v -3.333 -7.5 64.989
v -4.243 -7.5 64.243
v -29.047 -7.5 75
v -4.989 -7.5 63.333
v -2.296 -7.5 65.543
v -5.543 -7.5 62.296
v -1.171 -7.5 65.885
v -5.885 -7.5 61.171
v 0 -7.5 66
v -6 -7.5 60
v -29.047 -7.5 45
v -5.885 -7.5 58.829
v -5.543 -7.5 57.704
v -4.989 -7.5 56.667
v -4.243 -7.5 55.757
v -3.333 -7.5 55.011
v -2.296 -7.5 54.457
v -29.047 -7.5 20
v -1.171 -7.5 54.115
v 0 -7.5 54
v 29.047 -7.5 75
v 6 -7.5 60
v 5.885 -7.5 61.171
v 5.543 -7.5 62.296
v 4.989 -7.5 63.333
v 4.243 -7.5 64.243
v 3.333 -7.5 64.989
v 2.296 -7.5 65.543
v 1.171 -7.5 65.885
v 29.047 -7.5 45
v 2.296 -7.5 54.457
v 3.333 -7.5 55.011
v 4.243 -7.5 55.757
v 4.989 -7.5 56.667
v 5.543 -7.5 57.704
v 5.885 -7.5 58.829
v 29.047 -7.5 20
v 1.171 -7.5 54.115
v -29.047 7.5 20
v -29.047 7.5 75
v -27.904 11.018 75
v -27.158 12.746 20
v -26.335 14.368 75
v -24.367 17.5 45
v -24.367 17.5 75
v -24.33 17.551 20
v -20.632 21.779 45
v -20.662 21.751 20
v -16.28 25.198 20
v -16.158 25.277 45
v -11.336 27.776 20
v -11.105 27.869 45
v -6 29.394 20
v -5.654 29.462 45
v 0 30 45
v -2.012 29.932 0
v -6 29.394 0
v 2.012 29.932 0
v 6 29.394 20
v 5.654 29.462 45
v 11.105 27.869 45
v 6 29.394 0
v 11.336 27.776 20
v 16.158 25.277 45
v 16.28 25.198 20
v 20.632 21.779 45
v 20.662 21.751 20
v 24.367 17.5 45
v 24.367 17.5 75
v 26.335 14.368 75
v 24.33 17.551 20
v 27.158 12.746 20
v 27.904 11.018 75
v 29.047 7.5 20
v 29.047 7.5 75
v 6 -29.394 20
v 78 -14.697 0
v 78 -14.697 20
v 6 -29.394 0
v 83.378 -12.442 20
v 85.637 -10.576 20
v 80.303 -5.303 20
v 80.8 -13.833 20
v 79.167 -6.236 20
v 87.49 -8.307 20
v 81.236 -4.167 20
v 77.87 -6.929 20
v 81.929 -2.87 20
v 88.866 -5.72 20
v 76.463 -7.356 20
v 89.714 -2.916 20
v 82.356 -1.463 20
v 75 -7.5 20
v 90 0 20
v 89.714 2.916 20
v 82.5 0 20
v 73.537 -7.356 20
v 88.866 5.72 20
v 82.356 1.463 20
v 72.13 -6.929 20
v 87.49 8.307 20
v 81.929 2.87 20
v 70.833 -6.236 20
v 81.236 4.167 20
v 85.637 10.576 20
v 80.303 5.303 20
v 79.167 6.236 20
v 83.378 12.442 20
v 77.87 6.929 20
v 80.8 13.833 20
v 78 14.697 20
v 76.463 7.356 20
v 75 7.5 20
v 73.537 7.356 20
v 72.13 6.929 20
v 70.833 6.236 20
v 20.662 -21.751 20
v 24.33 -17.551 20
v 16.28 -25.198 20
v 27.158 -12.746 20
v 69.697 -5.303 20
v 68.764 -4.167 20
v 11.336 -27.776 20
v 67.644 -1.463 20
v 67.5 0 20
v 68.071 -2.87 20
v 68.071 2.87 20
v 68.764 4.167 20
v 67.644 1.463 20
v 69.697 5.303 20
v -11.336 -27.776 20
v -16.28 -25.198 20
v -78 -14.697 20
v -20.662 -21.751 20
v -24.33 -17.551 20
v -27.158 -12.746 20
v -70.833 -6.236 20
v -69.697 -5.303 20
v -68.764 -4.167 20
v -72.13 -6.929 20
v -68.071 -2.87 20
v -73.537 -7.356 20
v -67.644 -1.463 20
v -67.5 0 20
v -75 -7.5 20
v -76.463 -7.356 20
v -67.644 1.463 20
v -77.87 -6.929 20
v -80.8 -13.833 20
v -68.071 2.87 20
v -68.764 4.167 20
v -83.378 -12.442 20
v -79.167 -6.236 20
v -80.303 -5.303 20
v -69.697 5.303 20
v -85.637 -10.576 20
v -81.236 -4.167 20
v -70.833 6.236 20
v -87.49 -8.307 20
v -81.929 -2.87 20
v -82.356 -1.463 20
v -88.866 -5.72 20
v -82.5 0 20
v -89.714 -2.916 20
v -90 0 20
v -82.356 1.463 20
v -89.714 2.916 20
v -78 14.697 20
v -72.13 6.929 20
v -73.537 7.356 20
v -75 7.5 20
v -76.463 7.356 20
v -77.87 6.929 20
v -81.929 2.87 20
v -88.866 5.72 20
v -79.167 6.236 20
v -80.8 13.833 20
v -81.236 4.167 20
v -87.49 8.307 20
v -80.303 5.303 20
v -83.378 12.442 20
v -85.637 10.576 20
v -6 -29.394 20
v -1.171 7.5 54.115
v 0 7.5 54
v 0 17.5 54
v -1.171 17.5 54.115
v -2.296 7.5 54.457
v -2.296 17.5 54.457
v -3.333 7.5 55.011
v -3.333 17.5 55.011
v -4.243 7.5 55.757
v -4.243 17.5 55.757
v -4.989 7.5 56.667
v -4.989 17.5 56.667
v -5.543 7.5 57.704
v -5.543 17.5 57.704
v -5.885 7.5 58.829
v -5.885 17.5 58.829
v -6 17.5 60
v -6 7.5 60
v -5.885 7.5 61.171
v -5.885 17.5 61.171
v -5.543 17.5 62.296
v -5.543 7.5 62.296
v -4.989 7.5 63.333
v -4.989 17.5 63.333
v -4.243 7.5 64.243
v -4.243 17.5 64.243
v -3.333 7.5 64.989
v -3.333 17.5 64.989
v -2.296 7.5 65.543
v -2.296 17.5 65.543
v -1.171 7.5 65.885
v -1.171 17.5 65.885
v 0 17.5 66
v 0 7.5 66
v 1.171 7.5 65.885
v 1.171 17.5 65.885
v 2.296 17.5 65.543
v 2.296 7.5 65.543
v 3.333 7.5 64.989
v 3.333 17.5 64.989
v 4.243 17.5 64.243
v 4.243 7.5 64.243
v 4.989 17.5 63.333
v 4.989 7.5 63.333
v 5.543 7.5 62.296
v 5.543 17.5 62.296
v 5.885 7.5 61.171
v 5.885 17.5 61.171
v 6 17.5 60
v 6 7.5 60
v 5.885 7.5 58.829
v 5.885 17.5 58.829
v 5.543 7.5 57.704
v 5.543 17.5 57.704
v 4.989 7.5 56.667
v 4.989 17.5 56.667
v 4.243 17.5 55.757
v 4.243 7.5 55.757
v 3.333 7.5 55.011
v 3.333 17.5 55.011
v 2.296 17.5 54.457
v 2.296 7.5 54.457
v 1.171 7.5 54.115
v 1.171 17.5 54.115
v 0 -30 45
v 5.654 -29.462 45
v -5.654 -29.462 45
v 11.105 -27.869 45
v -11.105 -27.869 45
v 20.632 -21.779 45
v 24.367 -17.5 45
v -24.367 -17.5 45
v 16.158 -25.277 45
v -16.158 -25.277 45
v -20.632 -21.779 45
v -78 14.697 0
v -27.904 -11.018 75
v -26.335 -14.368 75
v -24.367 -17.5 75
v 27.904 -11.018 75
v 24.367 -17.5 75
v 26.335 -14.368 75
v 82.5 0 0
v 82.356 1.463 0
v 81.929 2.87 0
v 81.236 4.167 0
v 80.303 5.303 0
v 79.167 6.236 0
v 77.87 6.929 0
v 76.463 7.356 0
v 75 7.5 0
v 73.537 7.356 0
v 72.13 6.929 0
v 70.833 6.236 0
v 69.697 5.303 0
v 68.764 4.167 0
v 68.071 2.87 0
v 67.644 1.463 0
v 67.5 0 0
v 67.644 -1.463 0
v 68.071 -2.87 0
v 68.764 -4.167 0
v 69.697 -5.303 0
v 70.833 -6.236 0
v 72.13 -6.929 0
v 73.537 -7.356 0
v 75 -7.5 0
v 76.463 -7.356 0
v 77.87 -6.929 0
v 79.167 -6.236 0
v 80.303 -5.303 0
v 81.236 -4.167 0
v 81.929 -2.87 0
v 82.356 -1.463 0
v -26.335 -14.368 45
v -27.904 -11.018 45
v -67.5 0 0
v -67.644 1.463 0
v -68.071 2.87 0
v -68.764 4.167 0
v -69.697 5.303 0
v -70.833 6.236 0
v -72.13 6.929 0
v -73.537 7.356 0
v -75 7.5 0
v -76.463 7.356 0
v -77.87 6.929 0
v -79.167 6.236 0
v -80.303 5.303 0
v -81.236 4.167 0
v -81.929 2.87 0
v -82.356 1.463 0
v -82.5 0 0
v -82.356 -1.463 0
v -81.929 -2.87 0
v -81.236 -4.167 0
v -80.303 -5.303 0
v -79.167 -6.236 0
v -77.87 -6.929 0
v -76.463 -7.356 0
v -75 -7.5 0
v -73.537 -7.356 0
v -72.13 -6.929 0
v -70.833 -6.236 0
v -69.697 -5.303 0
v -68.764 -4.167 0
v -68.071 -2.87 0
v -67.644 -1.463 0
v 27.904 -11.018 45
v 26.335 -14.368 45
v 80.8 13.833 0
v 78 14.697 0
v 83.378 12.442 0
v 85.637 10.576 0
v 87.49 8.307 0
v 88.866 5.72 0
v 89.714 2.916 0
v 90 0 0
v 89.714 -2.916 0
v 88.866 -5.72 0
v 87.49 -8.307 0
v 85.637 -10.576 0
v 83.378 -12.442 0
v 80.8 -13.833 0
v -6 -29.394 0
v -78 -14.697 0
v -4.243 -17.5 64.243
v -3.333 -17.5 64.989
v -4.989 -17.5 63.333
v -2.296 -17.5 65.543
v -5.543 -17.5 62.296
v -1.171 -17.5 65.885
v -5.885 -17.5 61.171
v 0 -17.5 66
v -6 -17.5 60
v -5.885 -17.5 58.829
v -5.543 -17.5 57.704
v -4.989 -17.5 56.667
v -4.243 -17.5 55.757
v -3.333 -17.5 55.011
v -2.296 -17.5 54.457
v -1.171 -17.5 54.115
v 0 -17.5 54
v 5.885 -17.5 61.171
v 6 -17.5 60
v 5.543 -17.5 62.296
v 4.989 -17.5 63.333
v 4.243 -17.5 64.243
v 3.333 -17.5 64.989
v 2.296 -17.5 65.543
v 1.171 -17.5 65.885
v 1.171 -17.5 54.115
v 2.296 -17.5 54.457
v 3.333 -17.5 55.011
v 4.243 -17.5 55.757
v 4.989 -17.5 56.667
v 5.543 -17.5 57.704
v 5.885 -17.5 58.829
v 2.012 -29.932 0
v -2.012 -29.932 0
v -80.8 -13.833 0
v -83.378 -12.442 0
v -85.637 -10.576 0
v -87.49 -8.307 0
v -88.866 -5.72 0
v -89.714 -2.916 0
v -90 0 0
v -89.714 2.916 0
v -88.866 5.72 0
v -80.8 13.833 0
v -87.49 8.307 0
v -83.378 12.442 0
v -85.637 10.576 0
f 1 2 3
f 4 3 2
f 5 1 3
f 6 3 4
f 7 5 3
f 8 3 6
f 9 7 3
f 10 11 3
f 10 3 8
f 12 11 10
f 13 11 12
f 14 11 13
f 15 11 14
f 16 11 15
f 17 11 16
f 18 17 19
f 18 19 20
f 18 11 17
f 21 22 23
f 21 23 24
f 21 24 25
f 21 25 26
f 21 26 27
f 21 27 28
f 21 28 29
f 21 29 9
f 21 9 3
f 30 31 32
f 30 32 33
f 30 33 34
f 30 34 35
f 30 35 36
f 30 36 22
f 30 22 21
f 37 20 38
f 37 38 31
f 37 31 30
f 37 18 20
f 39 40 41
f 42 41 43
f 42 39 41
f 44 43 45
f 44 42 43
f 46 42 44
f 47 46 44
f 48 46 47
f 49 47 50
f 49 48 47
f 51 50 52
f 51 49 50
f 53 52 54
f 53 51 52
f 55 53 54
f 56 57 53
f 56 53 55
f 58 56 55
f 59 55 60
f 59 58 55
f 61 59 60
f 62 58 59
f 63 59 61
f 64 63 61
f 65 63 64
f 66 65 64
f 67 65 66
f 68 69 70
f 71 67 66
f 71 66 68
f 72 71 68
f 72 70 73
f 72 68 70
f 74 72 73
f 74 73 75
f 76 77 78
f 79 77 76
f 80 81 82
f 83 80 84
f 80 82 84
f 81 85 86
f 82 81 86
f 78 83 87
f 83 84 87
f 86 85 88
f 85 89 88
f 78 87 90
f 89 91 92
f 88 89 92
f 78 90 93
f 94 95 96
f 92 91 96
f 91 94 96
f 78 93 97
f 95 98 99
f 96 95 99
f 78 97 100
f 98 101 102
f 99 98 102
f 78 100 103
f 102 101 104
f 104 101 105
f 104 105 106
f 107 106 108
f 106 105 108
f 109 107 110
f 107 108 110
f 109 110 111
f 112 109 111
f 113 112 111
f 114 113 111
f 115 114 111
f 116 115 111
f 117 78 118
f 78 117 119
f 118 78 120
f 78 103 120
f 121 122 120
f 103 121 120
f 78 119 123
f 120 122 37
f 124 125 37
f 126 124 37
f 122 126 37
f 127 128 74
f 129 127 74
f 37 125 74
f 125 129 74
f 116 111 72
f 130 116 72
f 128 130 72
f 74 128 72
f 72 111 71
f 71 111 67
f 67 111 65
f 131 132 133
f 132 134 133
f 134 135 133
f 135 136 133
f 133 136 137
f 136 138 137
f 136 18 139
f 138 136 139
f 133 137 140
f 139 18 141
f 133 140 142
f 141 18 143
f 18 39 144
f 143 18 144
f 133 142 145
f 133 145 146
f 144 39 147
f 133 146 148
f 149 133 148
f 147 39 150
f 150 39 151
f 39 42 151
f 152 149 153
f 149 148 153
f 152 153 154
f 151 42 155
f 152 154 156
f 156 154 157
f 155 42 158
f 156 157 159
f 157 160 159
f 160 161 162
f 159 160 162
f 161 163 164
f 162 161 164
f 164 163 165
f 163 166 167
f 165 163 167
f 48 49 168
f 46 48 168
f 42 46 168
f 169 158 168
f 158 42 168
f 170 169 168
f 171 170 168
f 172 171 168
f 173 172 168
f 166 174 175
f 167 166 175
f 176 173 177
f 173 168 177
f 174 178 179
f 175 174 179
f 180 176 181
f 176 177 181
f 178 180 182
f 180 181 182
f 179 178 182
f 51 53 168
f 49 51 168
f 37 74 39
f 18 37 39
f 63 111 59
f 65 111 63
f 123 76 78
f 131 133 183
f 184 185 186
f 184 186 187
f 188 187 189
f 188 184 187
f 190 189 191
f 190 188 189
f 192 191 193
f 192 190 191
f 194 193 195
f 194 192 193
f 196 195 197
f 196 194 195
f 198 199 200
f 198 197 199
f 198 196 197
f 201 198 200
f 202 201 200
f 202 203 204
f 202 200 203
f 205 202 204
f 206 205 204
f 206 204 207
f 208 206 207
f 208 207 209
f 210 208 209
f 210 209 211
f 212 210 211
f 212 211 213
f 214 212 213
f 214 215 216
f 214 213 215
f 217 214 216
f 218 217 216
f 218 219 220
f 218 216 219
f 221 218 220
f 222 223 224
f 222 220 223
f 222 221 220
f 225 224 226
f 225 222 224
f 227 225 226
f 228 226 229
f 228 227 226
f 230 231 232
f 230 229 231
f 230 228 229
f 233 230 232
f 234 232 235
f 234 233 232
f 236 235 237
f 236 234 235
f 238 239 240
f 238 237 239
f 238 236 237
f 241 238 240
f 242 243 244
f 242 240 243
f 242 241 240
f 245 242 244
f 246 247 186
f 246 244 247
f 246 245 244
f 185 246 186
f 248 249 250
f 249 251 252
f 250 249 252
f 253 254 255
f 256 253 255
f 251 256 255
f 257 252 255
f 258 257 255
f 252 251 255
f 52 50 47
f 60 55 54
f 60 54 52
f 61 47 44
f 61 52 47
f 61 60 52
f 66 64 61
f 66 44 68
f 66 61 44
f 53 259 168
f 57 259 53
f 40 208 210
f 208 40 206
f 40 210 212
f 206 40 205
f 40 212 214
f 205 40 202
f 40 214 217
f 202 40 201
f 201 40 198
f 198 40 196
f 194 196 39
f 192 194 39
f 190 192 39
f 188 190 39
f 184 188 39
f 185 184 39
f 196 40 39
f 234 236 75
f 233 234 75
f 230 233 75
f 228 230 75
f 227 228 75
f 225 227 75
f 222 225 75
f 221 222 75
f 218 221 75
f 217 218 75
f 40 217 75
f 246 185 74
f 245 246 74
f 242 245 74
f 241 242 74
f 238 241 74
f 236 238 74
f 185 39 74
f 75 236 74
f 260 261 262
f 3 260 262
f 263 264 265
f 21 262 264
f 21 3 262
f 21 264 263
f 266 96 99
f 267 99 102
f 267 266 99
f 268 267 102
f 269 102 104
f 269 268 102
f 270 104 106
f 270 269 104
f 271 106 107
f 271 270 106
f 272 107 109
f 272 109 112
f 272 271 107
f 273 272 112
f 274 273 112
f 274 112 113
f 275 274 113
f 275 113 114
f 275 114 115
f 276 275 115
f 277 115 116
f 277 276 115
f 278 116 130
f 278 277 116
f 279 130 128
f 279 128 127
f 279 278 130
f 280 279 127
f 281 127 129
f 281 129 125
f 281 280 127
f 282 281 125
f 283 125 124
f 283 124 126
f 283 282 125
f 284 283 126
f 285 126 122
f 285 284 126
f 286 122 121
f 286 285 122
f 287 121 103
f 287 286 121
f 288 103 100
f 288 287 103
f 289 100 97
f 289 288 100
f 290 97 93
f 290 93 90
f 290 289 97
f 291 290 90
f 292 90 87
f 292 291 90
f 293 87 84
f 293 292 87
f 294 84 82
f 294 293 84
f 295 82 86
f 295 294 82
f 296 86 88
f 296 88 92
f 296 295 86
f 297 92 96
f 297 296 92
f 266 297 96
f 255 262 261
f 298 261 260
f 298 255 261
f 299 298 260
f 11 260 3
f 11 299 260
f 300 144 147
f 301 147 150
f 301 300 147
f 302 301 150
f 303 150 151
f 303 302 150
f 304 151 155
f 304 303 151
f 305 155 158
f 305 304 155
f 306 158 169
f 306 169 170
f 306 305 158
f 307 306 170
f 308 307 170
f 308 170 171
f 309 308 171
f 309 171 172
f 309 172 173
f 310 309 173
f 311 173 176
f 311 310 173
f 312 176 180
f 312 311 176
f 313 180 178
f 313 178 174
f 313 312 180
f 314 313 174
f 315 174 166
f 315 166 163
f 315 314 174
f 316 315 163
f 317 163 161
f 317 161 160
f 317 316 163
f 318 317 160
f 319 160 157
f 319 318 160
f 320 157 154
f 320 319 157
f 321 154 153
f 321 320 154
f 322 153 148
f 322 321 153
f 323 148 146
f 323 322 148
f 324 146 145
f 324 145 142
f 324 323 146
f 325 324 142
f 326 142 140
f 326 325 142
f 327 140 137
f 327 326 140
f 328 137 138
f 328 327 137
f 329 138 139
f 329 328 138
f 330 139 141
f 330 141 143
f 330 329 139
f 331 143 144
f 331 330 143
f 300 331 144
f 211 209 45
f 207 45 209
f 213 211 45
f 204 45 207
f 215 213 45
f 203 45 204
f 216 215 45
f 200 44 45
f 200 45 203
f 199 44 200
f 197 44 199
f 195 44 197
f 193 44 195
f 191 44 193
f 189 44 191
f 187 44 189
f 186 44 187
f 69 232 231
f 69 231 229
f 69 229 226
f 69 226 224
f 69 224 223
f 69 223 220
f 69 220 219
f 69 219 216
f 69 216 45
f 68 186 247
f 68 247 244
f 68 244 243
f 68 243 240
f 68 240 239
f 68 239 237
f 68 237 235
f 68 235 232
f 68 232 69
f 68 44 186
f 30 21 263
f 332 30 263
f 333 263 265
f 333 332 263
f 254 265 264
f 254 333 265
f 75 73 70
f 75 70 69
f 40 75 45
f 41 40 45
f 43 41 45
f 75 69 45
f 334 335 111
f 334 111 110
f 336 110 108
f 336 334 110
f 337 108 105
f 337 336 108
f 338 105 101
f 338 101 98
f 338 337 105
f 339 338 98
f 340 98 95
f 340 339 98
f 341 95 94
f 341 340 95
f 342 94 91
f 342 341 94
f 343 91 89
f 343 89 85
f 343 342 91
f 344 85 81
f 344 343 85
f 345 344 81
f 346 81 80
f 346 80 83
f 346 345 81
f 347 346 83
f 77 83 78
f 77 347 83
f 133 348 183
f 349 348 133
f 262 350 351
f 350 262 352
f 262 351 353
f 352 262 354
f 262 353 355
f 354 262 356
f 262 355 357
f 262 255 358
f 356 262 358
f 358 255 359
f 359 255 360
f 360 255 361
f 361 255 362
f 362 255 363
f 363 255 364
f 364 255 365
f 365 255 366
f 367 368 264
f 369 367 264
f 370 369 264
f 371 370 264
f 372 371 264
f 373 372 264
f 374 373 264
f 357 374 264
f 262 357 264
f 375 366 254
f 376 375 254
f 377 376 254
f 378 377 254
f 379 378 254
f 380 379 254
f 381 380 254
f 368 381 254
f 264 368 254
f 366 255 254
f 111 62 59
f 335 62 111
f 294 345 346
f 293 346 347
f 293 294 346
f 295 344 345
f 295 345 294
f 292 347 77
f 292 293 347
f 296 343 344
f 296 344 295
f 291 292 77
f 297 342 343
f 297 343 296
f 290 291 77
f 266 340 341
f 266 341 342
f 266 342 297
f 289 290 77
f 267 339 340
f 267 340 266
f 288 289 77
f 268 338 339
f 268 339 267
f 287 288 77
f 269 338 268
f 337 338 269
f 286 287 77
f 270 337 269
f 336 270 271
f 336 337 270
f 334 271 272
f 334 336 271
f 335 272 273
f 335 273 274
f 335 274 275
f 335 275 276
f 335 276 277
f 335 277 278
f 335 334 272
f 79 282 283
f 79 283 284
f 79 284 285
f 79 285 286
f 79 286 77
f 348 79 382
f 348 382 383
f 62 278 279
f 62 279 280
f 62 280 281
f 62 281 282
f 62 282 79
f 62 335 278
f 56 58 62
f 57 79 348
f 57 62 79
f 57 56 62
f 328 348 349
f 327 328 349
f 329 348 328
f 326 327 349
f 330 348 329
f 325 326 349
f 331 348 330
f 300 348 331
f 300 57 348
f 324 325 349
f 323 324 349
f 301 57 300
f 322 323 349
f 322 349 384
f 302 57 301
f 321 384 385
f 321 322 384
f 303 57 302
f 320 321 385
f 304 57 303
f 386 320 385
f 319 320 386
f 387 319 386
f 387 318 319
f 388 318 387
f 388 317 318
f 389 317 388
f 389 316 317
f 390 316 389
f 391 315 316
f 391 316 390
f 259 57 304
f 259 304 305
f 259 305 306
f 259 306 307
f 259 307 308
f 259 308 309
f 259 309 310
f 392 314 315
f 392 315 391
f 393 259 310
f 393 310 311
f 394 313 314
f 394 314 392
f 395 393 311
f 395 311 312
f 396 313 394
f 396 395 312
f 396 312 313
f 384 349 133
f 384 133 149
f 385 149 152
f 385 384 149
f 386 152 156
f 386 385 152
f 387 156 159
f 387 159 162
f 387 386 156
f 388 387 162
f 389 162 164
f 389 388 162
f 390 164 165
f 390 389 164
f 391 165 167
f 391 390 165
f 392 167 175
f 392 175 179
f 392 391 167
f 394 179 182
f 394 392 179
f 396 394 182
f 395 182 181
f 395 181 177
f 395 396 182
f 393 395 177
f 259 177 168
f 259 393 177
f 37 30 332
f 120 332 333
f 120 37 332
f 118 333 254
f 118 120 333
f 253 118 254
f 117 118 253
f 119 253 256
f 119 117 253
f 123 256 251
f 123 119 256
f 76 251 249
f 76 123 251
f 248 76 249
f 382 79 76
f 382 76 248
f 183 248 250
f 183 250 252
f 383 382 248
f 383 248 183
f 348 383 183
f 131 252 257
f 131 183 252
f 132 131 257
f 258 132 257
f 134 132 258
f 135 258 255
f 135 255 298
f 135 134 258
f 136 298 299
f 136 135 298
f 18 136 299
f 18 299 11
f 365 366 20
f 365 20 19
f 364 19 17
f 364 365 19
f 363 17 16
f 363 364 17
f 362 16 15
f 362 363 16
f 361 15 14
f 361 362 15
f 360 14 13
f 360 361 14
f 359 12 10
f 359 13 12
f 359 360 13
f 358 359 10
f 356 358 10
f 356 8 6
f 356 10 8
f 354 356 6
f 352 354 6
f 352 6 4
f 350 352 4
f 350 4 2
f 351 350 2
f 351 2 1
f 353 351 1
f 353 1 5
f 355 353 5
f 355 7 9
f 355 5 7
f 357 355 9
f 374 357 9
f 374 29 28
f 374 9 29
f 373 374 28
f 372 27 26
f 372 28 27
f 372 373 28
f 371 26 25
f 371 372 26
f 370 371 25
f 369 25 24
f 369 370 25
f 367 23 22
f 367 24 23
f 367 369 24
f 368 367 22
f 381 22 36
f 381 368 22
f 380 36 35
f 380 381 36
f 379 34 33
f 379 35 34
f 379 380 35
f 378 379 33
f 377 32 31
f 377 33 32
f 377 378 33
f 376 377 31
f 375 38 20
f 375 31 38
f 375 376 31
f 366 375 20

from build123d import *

# Parameters (mm, degrees)
SALIENTE_EXTRUIR1_DEPTH    = 20
CROQUIS9_8_R               = 7.5
CORTAR_EXTRUIR1_DEPTH      = 20
CROQUIS9_10_R              = 7.5
CORTAR_EXTRUIR2_DEPTH      = 20
SALIENTE_EXTRUIR2_DEPTH    = 45
SALIENTE_EXTRUIR3_DEPTH    = 75
CORTAR_EXTRUIR4_DEPTH      = 61
CORTAR_EXTRUIR4_DEPTH_BACK = 52
CROQUIS12_R                = 6


with BuildPart() as part:
    # Croquis9 → Saliente-Extruir1 (new body)
    with BuildSketch(Plane.XY):
        with BuildLine():
            Line((-78, 14.696938457), (-6, 29.393876913))
            ThreePointArc((-6, 29.393876913), (0, 30), (6, 29.393876913))
            Line((6, 29.393876913), (78, 14.696938457))
            ThreePointArc((78, 14.696938457), (90, 0), (78, -14.696938457))
            Line((78, -14.696938457), (6, -29.393876913))
            ThreePointArc((6, -29.393876913), (0, -30), (-6, -29.393876913))
            Line((-6, -29.393876913), (-78, -14.696938457))
            ThreePointArc((-78, -14.696938457), (-90, 0), (-78, 14.696938457))
        make_face()
    extrude(amount=SALIENTE_EXTRUIR1_DEPTH)

    # Croquis9<8> → Cortar-Extruir1 (cut)
    with BuildSketch(Plane.XY):
        with Locations((-75, 0)):
            Circle(CROQUIS9_8_R)
    extrude(amount=CORTAR_EXTRUIR1_DEPTH, mode=Mode.SUBTRACT)

    # Croquis9<10> → Cortar-Extruir2 (cut)
    with BuildSketch(Plane.XY):
        with Locations((75, 0)):
            Circle(CROQUIS9_10_R)
    extrude(amount=CORTAR_EXTRUIR2_DEPTH, mode=Mode.SUBTRACT)

    # Croquis10 → Saliente-Extruir2 (add)
    with BuildSketch(Plane.XY):
        with BuildLine():
            Line((-29.047375097, 7.5), (29.047375097, 7.5))
            ThreePointArc((29.047375097, 7.5), (0, 30), (-29.047375097, 7.5))
        make_face()
        with BuildLine():
            Line((-29.047375097, -7.5), (29.047375097, -7.5))
            ThreePointArc((29.047375097, -7.5), (0, -30), (-29.047375097, -7.5))
        make_face()
    extrude(amount=SALIENTE_EXTRUIR2_DEPTH)

    # Croquis11 → Saliente-Extruir3 (add)
    with BuildSketch(Plane.XY):
        with BuildLine():
            Line((-24.366985862, 17.5), (24.366985862, 17.5))
            ThreePointArc((24.366985862, 17.5), (27.171188586, 12.717173855), (29.047375097, 7.5))
            Line((29.047375097, 7.5), (-29.047375097, 7.5))
            ThreePointArc((-29.047375097, 7.5), (-27.171188586, 12.717173855), (-24.366985862, 17.5))
        make_face()
        with BuildLine():
            Line((-24.366985862, -17.5), (24.366985862, -17.5))
            ThreePointArc((24.366985862, -17.5), (27.171188586, -12.717173855), (29.047375097, -7.5))
            Line((29.047375097, -7.5), (-29.047375097, -7.5))
            ThreePointArc((-29.047375097, -7.5), (-27.171188586, -12.717173855), (-24.366985862, -17.5))
        make_face()
    extrude(amount=SALIENTE_EXTRUIR3_DEPTH)

    # Croquis12 → Cortar-Extruir4 (cut, two sides: drawn at the far end of the back side and taken through both)
    with BuildSketch(Plane(origin=(0, 0, 0), x_dir=(1, 0, 0), z_dir=(0, 1, 0)).offset(-CORTAR_EXTRUIR4_DEPTH_BACK)):
        with Locations((0, -60)):
            Circle(CROQUIS12_R)
    extrude(amount=CORTAR_EXTRUIR4_DEPTH + CORTAR_EXTRUIR4_DEPTH_BACK, mode=Mode.SUBTRACT)


solid = part.part
